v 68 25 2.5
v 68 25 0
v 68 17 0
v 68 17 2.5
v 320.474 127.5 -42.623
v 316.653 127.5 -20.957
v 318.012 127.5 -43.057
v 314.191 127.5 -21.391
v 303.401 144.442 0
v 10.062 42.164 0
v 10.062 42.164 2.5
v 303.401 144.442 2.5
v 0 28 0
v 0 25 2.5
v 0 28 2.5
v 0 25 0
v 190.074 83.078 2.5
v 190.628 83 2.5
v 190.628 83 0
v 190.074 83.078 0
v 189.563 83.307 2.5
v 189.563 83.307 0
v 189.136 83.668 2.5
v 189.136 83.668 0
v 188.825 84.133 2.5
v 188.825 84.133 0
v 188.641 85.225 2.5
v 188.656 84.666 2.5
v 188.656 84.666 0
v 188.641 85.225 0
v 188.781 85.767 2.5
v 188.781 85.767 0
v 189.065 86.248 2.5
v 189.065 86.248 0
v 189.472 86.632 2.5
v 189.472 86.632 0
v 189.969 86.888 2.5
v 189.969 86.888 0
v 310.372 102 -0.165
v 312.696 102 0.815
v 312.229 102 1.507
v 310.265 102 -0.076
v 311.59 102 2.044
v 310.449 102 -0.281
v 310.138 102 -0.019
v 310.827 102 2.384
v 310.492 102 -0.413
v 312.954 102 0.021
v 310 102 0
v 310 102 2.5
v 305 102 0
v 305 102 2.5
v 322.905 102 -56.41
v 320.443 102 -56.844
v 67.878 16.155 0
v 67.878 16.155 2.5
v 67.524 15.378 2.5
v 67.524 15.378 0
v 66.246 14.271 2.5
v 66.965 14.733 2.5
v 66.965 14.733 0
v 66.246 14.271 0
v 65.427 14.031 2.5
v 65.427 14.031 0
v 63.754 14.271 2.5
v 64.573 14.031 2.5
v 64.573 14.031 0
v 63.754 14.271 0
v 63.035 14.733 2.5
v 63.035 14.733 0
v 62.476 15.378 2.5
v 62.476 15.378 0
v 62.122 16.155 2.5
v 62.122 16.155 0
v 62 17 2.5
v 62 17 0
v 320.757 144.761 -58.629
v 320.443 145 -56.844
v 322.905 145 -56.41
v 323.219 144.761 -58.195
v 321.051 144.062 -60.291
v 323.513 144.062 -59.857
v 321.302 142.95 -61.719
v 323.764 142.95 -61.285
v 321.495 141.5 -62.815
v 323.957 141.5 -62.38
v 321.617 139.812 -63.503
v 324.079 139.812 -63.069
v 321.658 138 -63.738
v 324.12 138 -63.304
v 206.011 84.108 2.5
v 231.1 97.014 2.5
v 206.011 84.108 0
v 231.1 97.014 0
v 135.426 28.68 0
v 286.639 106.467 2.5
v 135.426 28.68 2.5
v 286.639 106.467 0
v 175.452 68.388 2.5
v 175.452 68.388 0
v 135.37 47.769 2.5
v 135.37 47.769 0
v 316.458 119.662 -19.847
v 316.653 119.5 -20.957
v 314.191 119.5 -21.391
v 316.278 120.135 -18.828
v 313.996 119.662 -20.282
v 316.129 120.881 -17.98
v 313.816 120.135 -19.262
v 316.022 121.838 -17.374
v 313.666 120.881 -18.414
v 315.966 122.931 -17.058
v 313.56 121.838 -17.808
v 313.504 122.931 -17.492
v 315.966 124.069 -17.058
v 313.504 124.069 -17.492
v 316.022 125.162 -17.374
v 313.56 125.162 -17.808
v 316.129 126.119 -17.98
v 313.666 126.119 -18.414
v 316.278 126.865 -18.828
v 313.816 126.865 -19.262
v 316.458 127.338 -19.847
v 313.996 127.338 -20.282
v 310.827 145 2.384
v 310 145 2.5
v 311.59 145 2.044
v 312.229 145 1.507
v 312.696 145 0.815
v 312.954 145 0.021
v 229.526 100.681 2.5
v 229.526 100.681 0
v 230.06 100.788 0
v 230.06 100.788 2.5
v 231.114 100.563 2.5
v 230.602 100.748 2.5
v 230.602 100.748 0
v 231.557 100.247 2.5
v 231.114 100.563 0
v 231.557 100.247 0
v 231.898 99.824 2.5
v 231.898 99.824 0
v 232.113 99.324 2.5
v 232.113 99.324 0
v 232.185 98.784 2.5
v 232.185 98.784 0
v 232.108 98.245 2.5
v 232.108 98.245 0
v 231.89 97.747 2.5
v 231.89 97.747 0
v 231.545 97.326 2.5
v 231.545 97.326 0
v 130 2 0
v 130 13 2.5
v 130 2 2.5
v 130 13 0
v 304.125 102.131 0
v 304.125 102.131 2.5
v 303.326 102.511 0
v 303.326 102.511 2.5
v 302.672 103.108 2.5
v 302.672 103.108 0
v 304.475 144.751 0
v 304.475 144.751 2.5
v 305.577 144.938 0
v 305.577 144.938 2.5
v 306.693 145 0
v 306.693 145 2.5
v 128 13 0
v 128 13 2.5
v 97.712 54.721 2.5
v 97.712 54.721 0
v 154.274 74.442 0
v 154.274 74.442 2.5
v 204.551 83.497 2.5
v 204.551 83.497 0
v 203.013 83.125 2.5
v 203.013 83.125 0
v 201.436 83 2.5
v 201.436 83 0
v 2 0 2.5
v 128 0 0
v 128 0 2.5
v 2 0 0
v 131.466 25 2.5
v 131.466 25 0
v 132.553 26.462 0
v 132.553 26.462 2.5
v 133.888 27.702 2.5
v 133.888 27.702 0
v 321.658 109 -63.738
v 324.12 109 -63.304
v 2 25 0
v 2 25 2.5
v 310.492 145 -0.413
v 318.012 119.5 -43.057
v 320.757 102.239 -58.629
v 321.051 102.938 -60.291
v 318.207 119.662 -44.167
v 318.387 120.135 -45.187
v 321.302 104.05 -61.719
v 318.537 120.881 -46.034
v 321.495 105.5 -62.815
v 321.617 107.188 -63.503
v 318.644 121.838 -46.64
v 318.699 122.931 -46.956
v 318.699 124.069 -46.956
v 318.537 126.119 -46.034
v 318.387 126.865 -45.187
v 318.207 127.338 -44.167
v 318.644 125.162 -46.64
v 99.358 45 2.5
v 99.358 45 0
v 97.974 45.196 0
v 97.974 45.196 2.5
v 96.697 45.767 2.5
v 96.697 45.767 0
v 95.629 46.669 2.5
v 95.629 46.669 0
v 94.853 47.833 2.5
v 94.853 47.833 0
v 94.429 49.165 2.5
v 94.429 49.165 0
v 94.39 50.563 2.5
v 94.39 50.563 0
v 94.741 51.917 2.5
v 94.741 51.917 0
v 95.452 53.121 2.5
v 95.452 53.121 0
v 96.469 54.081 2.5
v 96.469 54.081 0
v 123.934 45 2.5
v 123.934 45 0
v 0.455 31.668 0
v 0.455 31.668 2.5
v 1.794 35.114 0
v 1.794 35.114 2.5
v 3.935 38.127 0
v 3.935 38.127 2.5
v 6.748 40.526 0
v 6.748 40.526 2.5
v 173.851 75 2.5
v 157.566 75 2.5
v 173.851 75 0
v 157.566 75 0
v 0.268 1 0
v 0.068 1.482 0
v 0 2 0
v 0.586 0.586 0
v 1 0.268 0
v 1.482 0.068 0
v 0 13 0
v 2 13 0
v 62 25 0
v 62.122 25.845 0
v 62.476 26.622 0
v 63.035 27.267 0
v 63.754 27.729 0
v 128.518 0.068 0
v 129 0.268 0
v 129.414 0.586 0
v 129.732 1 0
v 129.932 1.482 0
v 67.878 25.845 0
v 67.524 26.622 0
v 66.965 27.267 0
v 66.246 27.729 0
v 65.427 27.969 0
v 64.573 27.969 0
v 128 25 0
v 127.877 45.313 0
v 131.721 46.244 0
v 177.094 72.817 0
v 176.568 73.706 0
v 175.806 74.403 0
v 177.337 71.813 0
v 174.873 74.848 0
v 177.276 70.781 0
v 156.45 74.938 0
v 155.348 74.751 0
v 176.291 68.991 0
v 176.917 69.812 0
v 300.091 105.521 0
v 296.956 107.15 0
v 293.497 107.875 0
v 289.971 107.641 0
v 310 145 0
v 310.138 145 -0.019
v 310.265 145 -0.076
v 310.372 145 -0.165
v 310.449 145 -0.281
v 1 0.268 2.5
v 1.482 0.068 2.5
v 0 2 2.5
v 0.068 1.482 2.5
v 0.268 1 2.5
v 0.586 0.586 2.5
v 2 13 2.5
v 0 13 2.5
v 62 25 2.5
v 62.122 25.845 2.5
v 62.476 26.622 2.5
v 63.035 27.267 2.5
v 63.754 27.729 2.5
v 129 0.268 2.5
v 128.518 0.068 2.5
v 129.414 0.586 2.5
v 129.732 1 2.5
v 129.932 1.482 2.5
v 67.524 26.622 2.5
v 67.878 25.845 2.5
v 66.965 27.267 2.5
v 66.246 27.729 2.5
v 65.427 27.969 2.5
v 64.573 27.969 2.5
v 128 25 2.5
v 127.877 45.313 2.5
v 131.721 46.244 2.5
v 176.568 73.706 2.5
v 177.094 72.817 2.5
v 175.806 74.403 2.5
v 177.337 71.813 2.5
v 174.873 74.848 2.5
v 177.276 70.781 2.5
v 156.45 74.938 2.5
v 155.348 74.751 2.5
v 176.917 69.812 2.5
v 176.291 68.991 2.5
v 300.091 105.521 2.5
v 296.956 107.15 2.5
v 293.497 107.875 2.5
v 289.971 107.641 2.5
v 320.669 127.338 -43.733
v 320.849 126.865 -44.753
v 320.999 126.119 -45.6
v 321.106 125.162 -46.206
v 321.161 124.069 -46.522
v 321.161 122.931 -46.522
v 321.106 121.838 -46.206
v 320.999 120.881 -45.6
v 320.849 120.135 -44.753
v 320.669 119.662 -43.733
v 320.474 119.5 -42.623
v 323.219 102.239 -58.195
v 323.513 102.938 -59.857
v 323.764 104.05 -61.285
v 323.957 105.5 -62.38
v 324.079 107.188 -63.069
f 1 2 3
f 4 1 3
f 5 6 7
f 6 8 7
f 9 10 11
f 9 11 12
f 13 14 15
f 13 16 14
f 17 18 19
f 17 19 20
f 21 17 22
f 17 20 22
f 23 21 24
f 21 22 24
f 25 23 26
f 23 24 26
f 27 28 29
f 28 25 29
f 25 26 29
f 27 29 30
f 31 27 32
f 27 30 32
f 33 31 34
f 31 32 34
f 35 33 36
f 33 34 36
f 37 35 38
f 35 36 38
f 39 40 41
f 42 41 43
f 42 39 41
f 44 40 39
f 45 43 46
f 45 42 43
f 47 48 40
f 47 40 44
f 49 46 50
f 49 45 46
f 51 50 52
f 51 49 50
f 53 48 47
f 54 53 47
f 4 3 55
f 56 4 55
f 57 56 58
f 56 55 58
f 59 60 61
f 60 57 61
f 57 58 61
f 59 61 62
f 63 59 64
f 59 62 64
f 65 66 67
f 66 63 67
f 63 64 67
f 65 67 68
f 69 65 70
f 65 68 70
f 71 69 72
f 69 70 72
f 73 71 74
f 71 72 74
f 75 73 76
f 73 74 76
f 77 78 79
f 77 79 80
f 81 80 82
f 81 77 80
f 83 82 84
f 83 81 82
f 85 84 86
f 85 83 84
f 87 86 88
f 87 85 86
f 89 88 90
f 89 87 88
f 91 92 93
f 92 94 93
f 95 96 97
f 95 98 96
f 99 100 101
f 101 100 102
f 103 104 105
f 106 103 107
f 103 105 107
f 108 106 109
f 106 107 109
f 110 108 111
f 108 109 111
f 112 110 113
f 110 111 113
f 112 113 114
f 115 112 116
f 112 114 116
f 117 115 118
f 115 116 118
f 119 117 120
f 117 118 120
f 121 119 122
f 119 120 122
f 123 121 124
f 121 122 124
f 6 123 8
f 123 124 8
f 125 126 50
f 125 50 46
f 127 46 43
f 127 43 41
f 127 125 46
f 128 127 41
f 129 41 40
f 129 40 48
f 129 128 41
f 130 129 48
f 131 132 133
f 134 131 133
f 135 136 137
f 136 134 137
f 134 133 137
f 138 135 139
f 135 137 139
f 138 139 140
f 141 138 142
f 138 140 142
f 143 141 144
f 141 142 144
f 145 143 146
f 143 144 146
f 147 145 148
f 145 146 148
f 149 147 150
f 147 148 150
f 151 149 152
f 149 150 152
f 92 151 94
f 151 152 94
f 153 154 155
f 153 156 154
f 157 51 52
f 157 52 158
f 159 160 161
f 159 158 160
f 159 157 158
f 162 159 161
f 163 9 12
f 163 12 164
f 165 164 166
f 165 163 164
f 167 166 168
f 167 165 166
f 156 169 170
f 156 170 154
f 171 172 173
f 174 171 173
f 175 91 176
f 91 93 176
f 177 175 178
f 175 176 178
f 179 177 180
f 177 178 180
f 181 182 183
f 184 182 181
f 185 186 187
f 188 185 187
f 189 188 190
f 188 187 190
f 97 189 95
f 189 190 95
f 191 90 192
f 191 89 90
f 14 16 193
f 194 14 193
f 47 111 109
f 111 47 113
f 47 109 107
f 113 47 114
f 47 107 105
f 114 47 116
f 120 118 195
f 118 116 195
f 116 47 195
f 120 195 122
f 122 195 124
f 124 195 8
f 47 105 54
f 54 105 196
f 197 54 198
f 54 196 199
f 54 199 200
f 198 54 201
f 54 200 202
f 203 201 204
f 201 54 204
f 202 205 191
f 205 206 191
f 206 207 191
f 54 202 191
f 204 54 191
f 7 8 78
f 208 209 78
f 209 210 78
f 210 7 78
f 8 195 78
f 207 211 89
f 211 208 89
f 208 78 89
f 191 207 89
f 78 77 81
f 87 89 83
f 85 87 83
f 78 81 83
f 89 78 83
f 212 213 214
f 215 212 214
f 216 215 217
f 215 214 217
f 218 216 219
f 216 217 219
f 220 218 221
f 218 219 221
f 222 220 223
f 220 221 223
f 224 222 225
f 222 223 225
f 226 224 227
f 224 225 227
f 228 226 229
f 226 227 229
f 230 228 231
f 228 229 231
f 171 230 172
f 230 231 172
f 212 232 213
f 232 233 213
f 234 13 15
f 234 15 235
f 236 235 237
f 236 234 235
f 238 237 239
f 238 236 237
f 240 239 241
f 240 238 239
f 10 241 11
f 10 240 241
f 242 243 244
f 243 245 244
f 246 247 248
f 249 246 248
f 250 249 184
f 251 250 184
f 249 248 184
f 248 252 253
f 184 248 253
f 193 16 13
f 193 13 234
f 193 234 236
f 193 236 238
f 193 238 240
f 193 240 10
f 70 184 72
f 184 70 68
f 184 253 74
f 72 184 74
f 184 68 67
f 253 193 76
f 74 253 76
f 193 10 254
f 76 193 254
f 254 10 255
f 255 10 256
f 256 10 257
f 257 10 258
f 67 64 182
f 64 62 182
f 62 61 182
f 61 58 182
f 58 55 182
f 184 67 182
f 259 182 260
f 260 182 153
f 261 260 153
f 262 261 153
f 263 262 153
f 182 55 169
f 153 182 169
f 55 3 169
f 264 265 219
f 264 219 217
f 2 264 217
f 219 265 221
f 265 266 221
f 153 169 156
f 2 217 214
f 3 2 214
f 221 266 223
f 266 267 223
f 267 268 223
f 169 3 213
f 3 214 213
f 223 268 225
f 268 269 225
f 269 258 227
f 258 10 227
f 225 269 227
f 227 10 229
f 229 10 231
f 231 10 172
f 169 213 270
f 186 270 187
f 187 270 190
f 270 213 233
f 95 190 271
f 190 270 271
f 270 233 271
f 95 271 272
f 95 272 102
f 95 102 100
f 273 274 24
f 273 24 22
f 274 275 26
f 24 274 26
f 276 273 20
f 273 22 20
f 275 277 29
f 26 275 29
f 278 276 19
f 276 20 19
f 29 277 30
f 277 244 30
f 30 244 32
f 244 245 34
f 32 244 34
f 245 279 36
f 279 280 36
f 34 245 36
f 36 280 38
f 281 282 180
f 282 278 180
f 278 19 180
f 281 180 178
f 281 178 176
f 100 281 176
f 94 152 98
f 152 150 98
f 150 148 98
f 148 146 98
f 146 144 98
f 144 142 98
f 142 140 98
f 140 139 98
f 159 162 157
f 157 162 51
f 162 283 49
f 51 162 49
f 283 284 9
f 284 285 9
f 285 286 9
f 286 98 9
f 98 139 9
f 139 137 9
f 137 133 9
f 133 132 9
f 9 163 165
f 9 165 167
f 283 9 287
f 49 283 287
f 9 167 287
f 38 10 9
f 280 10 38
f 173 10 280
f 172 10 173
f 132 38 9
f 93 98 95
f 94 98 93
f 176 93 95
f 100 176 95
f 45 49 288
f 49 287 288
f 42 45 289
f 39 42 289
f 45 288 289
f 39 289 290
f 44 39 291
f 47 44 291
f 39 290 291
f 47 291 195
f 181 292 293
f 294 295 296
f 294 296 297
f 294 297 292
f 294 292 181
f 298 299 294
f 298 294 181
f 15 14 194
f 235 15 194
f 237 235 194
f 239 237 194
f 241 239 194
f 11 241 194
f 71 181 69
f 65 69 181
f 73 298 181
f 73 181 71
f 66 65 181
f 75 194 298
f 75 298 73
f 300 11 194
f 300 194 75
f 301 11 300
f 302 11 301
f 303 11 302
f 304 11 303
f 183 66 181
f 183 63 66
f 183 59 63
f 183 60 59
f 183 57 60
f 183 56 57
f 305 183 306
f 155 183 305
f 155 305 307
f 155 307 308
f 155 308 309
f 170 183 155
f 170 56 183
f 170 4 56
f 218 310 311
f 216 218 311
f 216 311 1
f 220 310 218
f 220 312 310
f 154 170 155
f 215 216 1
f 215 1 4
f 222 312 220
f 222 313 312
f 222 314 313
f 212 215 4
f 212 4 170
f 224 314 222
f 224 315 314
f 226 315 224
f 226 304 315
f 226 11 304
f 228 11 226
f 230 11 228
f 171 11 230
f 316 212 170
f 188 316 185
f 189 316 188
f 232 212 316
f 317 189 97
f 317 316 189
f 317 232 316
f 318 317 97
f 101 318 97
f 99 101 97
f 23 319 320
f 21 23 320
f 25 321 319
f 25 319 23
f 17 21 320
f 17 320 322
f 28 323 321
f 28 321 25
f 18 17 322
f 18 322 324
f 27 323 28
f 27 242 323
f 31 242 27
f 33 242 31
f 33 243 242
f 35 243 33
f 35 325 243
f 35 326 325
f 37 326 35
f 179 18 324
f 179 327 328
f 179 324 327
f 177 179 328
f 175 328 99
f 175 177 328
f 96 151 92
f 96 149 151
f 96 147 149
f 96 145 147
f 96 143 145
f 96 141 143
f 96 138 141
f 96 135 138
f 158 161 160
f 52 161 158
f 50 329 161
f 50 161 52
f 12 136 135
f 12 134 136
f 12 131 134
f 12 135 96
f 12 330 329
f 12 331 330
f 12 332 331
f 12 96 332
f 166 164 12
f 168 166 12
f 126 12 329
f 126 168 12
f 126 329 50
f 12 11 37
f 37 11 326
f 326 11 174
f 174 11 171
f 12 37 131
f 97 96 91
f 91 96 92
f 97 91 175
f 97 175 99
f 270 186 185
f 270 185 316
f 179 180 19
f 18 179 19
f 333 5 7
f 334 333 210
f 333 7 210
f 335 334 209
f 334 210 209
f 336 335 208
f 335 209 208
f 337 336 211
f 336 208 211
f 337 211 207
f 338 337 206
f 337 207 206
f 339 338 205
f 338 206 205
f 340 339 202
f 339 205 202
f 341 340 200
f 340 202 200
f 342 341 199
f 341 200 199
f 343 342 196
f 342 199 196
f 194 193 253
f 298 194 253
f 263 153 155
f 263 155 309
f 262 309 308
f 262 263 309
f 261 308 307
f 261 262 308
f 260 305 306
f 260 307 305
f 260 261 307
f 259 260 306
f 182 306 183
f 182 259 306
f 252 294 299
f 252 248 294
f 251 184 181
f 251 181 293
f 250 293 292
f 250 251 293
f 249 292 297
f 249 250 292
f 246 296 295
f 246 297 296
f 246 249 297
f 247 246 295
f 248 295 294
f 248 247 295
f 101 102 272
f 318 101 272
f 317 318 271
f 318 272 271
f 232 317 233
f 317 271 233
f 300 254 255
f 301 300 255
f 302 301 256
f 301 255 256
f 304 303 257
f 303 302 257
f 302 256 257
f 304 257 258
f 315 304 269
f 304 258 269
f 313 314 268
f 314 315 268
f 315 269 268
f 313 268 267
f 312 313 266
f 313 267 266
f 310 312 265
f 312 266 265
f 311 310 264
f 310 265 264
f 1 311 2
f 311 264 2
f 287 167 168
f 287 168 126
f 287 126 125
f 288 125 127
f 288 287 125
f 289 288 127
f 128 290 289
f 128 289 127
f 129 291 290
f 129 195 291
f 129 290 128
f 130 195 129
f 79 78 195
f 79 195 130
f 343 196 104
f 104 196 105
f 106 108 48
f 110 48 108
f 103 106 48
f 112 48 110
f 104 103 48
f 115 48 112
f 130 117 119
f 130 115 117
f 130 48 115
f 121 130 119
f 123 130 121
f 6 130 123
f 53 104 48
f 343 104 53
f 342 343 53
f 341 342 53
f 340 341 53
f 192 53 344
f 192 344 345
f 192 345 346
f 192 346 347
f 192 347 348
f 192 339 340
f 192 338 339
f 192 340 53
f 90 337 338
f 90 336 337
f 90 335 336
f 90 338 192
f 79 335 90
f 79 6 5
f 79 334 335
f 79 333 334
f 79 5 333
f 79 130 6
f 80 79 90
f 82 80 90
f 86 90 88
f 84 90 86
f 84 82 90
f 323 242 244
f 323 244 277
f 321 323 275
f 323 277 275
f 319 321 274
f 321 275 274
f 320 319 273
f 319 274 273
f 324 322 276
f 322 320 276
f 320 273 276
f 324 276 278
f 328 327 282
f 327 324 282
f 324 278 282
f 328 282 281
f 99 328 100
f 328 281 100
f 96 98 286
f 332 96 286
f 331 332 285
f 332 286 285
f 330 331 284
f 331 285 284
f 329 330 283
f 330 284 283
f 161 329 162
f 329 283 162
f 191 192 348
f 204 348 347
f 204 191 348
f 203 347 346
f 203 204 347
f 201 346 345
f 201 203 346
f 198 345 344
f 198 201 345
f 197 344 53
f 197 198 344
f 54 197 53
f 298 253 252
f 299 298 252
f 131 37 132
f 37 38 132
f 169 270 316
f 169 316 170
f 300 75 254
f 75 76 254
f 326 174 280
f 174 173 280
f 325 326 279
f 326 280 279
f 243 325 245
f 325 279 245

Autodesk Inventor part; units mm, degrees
ref_plane "YZ Plane" through (0, 0, 0) normal (1, 0, 0) x (0, 1, 0)
ref_plane "XZ Plane" through (0, 0, 0) normal (0, 1, 0) x (-1, 0, 0)
sketch "草圖1" plane through (0, 0, 0) normal (0, 0, 1) x (1, 0, 0)
  line L0 (0, 0) -> (-7.8042, 0) construction
  line L1 (0, 0) -> (0, -16.694) construction
  line L2 (0, 2) -> (0, 13)
  line L3 (310, 145) -> (310, 102)
  line L4 (130, 19.7875) -> (130, 13) construction
  line L5 (128, 0) -> (2, 0)
  line L6 (310, 145) -> (368, 145)
  line L7 (375, 138) -> (375, 109)
  line L8 (368, 102) -> (310, 102)
  line L9 (332, 127.5) -> (354, 127.5)
  arc A0 (354, 119.5) -> (354, 127.5) centre (354, 123.5) ccw
  line L10 (354, 119.5) -> (332, 119.5)
  arc A1 (332, 127.5) -> (332, 119.5) centre (332, 123.5) ccw
  arc A2 (10.0615, 42.1637) -> (0, 28) centre (15, 28) ccw
  line L11 (10.0615, 42.1637) -> (303.401, 144.4425)
  line L12 (306.6934, 145) -> (310, 145)
  line L13 (310, 102) -> (305, 102)
  line L14 (286.6386, 106.4667) -> (135.4256, 28.6799)
  arc A3 (375, 138) -> (368, 145) centre (368, 138) ccw
  arc A4 (368, 102) -> (375, 109) centre (368, 109) ccw
  arc A5 (302.6723, 103.1075) -> (305, 102) centre (305, 105) ccw
  arc A6 (302.6723, 103.1075) -> (286.6386, 106.4667) centre (292.5854, 94.9066) ccw
  arc A7 (306.6934, 145) -> (303.401, 144.4425) centre (306.6934, 135) ccw
  arc A8 (135.4256, 28.6799) -> (131.466, 25) centre (140, 19.7875) ccw
  line L15 (0, 25) -> (2, 25)
  line L16 (2, 25) -> (2, 13)
  line L17 (2, 13) -> (0, 13)
  line L18 (0, 13) -> (0, 25) construction
  line L19 (65, 0) -> (65, 25) construction
  line L20 (131.466, 25) -> (128, 25)
  line L21 (128, 25) -> (128, 13)
  line L22 (128, 13) -> (130, 13)
  line L23 (130, 13) -> (130, 19.7875) construction
  arc A9 (0, 2) -> (2, 0) centre (2, 2) ccw
  arc A10 (128, 0) -> (130, 2) centre (128, 2) ccw
  line L24 (0, 13) -> (0, 25) construction
  line L25 (0, 25) -> (0, 28)
  line L26 (130, 19.7875) -> (130, 25) construction
  line L27 (130, 13) -> (130, 2)
  line L28 (123.9345, 45) -> (99.3585, 45)
  line L29 (157.566, 75) -> (173.8509, 75)
  line L30 (97.7123, 54.7212) -> (154.2737, 74.4425)
  line L31 (175.452, 68.3877) -> (135.3705, 47.769)
  arc A11 (175.452, 68.3877) -> (173.8509, 75) centre (173.8509, 71.5) ccw
  arc A12 (97.7123, 54.7212) -> (99.3585, 45) centre (99.3585, 50) ccw
  arc A13 (123.9345, 45) -> (135.3705, 47.769) centre (123.9345, 70) ccw
  arc A14 (157.566, 75) -> (154.2737, 74.4425) centre (157.566, 65) ccw
  line L32 (189.9693, 86.8885) -> (229.5263, 100.6808)
  line L33 (231.0996, 97.0139) -> (206.0106, 84.1076)
  line L34 (201.4362, 83) -> (190.6278, 83)
  arc A15 (231.0996, 97.0139) -> (229.5263, 100.6808) centre (230.1847, 98.7923) ccw
  arc A16 (201.4362, 83) -> (206.0106, 84.1076) centre (201.4362, 93) ccw
  arc A17 (189.9693, 86.8885) -> (190.6278, 83) centre (190.6278, 85) ccw
  arc A18 (131.466, 25) -> (130, 19.7875) centre (140, 19.7875) ccw construction
  line L35 (68, 25) -> (68, 17)
  arc A19 (62, 17) -> (68, 17) centre (65, 17) ccw
  line L36 (62, 17) -> (62, 25)
  arc A20 (68, 25) -> (62, 25) centre (65, 25) ccw
  point P0 (130, 0)
  point P1 (375, 145)
  point P2 (375, 102)
  point P3 (130, 25.8889)
  point P4 (305, 145)
  point P5 (305, 102)
  point P6 (305, 115.9121)
  point P7 (0, 10.2)
  point P8 (130, 28)
  point P9 (130, 10.2)
  dimension "d0" = 130
  dimension "d1" = 145
  dimension "d2" = 43
  dimension "d3" = 65
  dimension "d4" = 8
  dimension "d5" = 30
  dimension "d7" = 18
  dimension "d8" = 310
  dimension "d17" = 21.5
  dimension "d20" = 15
  dimension "d21" = 28
  dimension "d23" = 5
  dimension "d24" = 7
  dimension "d26" = 3
  dimension "d29" = 13
  dimension "d30" = 5
  dimension "d31" = 10
  dimension "d32" = 10
  dimension "d33" = 8
  dimension "d39" = 12
  dimension "d40" = 2
  dimension "d41" = 13
  dimension "d42" = 2
  dimension "d45" = 45
  dimension "d46" = 17
  dimension "d47" = 17
  dimension "d48" = 30
  dimension "d49" = 3.5
  dimension "d50" = 5
  dimension "d51" = 25
  dimension "d52" = 10
  dimension "d53" = 8
  dimension "d54" = 2
  dimension "d55" = 10
  dimension "d56" = 2
  dimension "d57" = 19.7875
  dimension "d60" = 6
  dimension "d61" = 8
  dimension "d63" = 17
extrude "擠出1" add sketch "草圖1" along normal blind 2.5
bend part "折彎零件1" radius 0.5 angle 80 line through (310, 145, 0) along (0, -1, 0) centre toward (0, 0, -1) moving side (1, 0, 0) both sides no
ref_plane "工作平面1" through (65, 2, 0) normal (-1, 0, 0) x (0, 0, 1)
properties part number "0 零件" material "不鏽鋼SUS-HL(砂紋)"
